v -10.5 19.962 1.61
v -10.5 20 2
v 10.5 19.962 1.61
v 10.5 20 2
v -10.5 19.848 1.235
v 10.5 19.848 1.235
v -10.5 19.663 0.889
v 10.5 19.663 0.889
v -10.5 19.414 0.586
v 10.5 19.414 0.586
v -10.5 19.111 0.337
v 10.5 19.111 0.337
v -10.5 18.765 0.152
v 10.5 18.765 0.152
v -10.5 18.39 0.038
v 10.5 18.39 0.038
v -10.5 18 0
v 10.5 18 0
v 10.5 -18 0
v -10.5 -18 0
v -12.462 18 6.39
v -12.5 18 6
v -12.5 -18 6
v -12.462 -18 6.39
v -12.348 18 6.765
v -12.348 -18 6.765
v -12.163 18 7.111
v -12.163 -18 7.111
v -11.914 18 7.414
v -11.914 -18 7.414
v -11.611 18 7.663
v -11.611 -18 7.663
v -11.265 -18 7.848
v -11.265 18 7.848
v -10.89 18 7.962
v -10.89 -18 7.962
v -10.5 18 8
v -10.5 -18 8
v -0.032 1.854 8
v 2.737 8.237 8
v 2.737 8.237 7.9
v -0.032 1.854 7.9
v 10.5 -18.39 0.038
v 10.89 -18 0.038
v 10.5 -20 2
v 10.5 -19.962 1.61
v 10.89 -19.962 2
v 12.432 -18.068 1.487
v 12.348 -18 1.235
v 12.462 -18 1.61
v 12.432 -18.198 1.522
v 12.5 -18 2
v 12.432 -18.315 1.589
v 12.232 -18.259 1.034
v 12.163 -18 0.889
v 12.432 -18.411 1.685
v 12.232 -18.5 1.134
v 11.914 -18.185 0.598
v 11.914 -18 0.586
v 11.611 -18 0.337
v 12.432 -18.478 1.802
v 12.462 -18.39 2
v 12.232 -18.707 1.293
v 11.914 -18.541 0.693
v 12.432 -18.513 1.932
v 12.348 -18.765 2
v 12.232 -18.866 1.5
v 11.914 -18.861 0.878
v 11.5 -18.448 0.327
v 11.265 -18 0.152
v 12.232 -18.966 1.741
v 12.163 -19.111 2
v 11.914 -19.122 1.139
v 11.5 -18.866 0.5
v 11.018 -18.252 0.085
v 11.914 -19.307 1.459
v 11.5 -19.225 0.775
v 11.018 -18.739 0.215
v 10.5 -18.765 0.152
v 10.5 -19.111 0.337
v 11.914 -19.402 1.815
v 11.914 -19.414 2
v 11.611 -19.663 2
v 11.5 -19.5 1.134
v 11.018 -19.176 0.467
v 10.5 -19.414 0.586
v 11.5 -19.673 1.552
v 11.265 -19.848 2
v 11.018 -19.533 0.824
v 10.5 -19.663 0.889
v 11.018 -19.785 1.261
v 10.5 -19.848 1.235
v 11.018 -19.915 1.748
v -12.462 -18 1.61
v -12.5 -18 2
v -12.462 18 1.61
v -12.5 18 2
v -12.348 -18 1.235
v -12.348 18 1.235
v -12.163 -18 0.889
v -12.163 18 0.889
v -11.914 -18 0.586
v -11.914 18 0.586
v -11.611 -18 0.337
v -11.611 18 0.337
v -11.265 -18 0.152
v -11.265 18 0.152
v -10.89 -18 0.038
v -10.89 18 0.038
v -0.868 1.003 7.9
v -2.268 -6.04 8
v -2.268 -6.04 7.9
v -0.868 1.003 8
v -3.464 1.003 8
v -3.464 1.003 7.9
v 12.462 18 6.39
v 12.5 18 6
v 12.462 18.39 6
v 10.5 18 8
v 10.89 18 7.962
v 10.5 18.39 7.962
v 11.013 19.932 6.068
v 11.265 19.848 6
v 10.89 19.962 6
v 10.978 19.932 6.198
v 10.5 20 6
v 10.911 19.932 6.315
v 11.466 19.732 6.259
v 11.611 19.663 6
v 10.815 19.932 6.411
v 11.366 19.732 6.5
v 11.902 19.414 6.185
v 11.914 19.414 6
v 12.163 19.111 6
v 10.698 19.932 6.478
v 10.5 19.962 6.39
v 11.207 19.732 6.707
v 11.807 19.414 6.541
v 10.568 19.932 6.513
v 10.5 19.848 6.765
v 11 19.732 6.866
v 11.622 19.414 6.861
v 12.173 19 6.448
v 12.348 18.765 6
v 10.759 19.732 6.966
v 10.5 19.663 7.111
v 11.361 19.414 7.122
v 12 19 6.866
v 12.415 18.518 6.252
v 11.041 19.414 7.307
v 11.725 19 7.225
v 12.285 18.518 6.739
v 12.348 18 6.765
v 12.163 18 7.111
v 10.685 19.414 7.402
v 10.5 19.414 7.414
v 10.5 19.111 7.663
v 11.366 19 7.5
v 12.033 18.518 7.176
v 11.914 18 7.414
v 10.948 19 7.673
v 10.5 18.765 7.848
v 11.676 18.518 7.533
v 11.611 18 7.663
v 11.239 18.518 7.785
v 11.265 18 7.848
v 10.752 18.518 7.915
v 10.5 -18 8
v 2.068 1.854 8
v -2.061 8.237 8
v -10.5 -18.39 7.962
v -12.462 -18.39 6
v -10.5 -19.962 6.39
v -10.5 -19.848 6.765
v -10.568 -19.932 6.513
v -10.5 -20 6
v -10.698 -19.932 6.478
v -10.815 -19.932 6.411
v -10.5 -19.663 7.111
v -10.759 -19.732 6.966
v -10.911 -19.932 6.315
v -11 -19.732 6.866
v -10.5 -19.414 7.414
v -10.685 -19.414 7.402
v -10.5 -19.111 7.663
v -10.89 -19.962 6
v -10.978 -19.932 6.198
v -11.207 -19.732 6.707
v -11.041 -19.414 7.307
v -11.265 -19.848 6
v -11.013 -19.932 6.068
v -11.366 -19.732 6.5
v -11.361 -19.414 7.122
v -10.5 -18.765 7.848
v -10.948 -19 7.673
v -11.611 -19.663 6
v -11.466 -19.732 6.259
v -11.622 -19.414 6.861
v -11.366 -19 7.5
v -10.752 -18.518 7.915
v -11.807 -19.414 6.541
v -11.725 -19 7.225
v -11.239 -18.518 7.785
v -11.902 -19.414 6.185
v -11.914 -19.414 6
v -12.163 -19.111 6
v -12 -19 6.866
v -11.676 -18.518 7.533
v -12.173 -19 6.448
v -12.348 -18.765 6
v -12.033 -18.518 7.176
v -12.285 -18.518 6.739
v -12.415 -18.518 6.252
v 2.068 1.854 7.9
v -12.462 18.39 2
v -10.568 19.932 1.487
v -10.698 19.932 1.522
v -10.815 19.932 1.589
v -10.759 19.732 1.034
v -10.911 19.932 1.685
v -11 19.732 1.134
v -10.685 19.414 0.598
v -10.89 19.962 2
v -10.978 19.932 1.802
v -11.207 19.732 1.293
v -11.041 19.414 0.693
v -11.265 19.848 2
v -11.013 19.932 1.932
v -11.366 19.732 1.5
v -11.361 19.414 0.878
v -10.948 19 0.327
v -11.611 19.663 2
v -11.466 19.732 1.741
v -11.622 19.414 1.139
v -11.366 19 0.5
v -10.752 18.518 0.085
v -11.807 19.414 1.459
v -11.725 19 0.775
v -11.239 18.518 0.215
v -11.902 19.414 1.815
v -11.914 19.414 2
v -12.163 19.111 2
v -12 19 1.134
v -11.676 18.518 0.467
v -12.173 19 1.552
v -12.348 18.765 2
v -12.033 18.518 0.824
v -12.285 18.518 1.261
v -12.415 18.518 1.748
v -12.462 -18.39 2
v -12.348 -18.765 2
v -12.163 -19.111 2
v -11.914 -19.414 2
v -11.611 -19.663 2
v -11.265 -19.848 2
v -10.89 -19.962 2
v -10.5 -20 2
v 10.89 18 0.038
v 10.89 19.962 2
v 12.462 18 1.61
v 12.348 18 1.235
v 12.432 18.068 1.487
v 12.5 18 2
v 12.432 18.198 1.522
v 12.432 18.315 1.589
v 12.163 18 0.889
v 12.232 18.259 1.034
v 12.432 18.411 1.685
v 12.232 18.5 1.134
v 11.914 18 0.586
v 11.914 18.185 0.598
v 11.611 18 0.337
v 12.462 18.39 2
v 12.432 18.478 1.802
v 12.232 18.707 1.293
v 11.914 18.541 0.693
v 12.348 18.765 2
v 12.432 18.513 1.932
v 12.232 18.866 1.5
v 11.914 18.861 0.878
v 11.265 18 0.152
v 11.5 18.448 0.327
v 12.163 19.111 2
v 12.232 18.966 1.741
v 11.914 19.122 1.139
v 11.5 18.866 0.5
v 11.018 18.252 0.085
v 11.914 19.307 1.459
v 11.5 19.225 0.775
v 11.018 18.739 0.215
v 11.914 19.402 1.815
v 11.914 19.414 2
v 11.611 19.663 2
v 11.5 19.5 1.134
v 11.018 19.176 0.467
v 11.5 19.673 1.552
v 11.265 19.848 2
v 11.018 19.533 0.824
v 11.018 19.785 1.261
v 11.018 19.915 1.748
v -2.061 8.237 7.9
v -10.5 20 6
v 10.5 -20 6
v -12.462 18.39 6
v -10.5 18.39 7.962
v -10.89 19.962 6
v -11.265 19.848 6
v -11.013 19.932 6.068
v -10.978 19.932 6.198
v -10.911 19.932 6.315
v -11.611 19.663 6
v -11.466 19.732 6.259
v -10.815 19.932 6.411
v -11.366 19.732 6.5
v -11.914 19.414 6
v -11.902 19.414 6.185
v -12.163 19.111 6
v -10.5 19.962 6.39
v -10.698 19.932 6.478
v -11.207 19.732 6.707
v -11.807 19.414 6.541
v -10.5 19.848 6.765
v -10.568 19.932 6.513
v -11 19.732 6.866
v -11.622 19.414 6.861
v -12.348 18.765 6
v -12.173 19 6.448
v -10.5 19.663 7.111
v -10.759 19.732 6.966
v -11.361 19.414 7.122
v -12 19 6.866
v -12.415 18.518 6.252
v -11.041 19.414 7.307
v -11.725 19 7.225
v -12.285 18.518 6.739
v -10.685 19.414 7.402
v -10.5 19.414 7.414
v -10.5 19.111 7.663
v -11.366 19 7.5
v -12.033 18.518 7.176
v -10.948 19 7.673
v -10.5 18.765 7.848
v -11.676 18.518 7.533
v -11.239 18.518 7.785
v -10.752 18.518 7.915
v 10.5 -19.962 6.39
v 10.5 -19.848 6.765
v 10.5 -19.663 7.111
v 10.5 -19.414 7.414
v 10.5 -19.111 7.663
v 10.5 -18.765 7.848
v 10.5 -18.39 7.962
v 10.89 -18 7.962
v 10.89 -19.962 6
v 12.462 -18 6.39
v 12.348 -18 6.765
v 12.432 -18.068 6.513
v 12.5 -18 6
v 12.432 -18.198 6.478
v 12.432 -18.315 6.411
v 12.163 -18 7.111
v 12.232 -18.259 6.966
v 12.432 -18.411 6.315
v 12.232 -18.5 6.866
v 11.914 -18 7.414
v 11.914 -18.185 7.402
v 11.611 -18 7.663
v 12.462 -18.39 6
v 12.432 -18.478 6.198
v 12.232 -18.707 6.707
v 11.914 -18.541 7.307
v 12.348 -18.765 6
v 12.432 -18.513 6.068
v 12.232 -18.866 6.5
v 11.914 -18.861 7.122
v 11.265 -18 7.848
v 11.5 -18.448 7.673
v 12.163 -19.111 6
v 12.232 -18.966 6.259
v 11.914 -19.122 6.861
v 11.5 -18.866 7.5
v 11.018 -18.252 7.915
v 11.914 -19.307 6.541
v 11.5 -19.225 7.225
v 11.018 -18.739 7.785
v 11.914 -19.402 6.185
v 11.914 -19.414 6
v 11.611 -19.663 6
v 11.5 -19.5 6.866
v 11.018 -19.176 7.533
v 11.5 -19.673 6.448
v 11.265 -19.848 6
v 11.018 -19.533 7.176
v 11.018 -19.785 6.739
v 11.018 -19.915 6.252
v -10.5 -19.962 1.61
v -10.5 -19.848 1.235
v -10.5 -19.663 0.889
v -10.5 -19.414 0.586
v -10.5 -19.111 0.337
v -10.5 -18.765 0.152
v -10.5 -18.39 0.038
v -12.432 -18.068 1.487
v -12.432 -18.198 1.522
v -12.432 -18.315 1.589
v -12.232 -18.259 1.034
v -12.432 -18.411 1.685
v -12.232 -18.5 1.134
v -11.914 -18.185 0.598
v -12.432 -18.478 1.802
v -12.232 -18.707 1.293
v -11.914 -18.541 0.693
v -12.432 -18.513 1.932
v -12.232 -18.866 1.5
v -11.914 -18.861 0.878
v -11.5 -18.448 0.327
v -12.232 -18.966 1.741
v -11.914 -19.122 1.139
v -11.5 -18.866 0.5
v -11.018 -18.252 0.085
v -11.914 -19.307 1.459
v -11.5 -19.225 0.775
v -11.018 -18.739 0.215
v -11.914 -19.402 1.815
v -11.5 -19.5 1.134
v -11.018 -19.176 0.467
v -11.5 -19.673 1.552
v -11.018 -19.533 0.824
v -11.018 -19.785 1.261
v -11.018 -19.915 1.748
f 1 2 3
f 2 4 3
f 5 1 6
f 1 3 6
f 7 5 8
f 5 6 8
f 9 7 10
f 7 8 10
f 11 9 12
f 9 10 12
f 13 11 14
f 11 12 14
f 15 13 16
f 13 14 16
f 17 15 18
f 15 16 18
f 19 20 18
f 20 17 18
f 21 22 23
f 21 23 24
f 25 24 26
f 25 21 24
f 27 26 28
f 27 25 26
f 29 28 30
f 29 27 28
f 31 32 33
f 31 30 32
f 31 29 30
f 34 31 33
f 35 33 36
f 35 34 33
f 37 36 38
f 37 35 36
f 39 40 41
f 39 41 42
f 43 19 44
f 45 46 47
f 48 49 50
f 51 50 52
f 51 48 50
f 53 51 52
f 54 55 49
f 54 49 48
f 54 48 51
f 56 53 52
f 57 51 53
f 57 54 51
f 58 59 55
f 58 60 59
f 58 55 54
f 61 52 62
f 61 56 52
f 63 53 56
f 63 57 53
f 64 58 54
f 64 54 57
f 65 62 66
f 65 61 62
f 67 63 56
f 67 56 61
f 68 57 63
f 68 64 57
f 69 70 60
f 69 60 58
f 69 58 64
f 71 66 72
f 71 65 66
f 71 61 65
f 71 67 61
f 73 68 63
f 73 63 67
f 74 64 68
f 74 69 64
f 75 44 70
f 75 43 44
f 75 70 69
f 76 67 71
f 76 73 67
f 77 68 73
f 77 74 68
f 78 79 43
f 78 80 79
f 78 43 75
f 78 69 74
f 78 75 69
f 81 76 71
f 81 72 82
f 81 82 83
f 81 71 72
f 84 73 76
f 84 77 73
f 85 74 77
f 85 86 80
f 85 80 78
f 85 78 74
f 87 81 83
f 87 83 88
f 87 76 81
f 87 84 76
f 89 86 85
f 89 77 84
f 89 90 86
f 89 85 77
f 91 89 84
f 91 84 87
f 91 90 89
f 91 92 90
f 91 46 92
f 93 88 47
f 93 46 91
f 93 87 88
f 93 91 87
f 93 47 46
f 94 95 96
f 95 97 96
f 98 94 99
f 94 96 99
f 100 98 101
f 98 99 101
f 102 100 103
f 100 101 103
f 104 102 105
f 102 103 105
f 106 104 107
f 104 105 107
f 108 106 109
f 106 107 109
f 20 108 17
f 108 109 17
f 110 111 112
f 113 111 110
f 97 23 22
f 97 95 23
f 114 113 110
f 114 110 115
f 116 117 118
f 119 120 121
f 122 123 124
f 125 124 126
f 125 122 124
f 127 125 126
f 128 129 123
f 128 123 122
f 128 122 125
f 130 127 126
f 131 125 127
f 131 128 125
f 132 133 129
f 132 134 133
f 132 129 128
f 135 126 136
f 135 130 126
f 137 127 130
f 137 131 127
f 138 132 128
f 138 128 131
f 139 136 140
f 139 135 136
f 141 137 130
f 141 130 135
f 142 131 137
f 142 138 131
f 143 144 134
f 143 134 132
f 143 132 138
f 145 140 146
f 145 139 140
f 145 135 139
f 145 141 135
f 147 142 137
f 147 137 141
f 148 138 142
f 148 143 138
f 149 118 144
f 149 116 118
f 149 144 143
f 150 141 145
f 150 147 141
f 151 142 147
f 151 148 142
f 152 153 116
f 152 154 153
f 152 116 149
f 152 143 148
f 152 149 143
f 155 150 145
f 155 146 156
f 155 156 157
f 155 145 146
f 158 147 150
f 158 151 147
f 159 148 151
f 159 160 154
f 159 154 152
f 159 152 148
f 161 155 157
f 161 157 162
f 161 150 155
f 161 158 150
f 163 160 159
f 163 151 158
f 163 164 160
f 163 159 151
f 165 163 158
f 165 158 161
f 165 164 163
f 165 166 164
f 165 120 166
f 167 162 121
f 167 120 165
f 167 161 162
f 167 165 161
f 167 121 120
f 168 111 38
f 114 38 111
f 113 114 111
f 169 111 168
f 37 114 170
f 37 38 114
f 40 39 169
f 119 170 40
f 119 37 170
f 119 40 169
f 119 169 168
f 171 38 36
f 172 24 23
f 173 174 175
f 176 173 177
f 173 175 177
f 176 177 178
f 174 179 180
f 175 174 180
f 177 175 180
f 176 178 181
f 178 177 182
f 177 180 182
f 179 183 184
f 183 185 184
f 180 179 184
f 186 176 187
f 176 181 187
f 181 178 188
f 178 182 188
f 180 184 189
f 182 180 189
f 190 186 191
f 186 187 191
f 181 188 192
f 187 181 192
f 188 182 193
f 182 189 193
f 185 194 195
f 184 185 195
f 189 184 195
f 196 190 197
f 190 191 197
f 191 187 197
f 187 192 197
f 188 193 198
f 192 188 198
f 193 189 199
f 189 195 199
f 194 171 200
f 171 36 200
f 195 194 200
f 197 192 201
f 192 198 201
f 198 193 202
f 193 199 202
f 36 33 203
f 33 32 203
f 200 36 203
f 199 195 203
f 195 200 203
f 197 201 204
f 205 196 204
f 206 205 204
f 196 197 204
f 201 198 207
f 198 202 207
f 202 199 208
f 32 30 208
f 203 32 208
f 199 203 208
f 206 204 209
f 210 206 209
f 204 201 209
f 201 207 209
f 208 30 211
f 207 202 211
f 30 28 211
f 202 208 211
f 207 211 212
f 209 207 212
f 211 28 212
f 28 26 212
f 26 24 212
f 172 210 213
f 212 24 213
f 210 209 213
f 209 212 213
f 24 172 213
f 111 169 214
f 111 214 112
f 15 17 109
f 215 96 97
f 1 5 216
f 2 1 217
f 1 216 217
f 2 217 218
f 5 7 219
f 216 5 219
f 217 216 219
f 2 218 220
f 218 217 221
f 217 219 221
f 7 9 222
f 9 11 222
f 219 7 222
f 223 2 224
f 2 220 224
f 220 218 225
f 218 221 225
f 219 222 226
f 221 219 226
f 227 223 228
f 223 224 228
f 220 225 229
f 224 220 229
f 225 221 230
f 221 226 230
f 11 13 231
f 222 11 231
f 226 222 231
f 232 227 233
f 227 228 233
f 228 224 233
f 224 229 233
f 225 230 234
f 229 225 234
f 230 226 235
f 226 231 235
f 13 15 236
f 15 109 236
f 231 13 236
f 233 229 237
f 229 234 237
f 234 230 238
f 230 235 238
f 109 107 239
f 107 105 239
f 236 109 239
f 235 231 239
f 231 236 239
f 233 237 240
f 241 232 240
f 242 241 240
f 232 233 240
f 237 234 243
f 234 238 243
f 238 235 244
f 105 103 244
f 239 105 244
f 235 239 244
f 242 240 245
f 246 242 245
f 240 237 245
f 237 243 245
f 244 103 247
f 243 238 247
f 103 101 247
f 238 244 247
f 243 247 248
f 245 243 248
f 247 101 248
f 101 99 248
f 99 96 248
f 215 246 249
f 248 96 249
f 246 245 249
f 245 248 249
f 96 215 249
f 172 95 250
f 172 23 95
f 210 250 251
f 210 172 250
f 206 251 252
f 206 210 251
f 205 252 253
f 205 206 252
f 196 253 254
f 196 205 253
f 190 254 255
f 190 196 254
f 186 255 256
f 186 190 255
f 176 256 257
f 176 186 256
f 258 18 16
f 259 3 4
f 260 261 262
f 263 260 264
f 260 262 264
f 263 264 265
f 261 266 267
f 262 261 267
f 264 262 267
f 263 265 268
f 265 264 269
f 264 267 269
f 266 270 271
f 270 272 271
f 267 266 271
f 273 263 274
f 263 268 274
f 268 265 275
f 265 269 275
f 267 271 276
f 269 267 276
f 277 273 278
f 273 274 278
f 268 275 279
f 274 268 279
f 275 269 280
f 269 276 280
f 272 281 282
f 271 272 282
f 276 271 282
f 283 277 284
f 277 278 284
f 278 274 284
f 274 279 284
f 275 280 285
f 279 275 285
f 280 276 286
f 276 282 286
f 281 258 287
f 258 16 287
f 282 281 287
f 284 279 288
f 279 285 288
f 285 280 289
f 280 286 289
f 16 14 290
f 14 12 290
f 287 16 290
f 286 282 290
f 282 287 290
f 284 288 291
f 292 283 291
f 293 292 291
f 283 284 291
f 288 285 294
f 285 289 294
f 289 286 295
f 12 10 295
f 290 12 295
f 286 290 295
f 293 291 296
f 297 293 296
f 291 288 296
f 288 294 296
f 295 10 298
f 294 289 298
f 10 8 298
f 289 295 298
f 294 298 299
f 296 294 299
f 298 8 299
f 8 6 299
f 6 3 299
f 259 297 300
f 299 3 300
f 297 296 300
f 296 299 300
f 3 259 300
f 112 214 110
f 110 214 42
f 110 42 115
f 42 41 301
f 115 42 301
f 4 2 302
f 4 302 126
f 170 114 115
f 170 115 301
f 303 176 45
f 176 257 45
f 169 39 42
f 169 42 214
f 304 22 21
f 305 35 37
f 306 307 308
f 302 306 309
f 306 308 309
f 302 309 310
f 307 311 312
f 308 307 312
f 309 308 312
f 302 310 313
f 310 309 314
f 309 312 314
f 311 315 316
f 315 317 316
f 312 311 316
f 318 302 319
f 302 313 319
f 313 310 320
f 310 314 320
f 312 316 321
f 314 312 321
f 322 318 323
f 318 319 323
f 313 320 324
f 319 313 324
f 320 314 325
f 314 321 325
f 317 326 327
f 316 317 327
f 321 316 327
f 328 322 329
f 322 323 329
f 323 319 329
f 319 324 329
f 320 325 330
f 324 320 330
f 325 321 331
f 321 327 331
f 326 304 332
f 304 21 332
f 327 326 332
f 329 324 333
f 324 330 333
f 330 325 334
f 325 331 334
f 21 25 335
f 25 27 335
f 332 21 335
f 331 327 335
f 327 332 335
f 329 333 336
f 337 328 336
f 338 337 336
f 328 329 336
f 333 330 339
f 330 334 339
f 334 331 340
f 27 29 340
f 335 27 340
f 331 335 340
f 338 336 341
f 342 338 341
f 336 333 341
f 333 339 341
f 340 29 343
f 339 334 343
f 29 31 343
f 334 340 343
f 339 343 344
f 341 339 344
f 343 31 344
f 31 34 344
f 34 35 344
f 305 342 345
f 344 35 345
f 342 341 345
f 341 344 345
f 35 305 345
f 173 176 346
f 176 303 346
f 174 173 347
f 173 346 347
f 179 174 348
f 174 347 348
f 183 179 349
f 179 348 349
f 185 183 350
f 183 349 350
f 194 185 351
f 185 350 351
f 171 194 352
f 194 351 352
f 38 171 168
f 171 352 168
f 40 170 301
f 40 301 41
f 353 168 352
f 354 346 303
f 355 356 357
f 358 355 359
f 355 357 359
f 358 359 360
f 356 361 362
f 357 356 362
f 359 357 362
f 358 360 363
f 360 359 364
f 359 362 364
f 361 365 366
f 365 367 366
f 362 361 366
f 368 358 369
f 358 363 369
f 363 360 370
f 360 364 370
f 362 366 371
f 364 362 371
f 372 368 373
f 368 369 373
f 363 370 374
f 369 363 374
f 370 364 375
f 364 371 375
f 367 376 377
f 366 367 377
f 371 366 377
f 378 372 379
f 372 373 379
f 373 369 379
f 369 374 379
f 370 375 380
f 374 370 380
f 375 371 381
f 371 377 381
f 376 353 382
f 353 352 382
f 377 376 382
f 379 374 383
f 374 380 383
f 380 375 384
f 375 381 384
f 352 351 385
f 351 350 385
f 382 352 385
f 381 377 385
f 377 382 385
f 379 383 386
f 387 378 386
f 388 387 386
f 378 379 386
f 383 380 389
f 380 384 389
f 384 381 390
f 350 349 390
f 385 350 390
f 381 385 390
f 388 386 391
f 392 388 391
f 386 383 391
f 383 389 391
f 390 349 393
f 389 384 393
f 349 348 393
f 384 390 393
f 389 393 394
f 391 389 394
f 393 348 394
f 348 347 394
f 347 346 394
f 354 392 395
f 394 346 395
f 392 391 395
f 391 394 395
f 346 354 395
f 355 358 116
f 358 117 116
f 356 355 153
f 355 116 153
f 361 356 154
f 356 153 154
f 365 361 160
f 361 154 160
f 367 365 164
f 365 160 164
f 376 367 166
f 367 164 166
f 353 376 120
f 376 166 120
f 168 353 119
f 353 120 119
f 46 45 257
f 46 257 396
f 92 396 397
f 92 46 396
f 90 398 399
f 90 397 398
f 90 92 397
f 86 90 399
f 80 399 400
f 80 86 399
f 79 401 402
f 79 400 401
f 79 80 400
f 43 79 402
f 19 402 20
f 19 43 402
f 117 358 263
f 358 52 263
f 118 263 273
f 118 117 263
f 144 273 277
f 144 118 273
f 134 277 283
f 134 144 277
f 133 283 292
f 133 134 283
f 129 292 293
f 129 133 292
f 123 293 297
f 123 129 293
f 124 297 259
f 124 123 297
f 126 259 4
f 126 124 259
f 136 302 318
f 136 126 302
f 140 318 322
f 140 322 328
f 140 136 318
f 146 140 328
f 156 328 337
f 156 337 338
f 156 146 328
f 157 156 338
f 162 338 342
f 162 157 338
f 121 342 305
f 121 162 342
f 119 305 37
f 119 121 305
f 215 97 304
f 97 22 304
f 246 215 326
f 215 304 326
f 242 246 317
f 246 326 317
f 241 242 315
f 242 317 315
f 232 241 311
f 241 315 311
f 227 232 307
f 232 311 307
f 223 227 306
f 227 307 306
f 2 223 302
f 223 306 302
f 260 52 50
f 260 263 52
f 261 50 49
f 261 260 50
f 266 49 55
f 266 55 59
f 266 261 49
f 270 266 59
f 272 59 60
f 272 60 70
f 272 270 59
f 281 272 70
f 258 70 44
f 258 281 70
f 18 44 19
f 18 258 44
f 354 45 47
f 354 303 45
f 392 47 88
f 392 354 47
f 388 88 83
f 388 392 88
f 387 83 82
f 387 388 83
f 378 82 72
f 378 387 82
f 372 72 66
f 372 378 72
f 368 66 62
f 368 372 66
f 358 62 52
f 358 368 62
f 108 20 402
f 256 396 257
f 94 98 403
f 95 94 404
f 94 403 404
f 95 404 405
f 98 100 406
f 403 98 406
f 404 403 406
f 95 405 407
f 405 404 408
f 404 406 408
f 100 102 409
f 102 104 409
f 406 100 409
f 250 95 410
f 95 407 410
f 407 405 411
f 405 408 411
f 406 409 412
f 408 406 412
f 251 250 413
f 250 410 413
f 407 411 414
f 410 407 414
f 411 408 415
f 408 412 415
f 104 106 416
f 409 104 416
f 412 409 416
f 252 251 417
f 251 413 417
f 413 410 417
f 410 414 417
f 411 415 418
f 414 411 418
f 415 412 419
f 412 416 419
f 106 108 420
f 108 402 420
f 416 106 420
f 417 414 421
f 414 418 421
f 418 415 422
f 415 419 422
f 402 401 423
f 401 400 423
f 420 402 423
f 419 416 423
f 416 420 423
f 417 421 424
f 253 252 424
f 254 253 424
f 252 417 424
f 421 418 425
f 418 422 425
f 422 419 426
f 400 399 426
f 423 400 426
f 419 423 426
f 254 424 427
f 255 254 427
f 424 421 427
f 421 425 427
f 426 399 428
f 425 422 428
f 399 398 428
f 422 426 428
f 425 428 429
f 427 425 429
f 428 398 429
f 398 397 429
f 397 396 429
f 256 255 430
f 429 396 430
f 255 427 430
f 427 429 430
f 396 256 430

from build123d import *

# Parameters (mm, degrees)
SKETCH1_W           = 25
SKETCH1_H           = 40
BOSS_EXTRUDE1_DEPTH = 8
FILLET1_R           = 2
CUT_EXTRUDE1_DEPTH  = 0.1


with BuildPart() as part:
    # Sketch1 → Boss-Extrude1 (new body)
    with BuildSketch(Plane.XY):
        Rectangle(SKETCH1_W, SKETCH1_H)
    extrude(amount=BOSS_EXTRUDE1_DEPTH)

    # Fillet1
    fillet1_edges = [part.edges().sort_by_distance(p)[0] for p in [
        (-12.5, 0, 8),
        (0, -20, 8),
        (12.5, 0, 8),
        (0, -20, 0),
        (-12.5, 0, 0),
        (0, 20, 0),
        (12.5, 0, 0),
        (12.5, -20, 4),
        (-12.5, -20, 4),
        (-12.5, 20, 4),
        (12.5, 20, 4),
        (0, 20, 8),
    ]]
    fillet(fillet1_edges, radius=FILLET1_R)

    # Sketch2 → Cut-Extrude1 (cut)
    with BuildSketch(Plane.XY.offset(8)):
        Polygon((-2.061020471, 8.237438207), (2.736573232, 8.237438207), (-0.031843364, 1.854183508), (2.068180648, 1.854183508), (-2.268382383, -6.039716385), (-0.867604628, 1.003082881), (-3.464302761, 1.003082881), align=None)
    extrude(amount=-CUT_EXTRUDE1_DEPTH, mode=Mode.SUBTRACT)


solid = part.part
